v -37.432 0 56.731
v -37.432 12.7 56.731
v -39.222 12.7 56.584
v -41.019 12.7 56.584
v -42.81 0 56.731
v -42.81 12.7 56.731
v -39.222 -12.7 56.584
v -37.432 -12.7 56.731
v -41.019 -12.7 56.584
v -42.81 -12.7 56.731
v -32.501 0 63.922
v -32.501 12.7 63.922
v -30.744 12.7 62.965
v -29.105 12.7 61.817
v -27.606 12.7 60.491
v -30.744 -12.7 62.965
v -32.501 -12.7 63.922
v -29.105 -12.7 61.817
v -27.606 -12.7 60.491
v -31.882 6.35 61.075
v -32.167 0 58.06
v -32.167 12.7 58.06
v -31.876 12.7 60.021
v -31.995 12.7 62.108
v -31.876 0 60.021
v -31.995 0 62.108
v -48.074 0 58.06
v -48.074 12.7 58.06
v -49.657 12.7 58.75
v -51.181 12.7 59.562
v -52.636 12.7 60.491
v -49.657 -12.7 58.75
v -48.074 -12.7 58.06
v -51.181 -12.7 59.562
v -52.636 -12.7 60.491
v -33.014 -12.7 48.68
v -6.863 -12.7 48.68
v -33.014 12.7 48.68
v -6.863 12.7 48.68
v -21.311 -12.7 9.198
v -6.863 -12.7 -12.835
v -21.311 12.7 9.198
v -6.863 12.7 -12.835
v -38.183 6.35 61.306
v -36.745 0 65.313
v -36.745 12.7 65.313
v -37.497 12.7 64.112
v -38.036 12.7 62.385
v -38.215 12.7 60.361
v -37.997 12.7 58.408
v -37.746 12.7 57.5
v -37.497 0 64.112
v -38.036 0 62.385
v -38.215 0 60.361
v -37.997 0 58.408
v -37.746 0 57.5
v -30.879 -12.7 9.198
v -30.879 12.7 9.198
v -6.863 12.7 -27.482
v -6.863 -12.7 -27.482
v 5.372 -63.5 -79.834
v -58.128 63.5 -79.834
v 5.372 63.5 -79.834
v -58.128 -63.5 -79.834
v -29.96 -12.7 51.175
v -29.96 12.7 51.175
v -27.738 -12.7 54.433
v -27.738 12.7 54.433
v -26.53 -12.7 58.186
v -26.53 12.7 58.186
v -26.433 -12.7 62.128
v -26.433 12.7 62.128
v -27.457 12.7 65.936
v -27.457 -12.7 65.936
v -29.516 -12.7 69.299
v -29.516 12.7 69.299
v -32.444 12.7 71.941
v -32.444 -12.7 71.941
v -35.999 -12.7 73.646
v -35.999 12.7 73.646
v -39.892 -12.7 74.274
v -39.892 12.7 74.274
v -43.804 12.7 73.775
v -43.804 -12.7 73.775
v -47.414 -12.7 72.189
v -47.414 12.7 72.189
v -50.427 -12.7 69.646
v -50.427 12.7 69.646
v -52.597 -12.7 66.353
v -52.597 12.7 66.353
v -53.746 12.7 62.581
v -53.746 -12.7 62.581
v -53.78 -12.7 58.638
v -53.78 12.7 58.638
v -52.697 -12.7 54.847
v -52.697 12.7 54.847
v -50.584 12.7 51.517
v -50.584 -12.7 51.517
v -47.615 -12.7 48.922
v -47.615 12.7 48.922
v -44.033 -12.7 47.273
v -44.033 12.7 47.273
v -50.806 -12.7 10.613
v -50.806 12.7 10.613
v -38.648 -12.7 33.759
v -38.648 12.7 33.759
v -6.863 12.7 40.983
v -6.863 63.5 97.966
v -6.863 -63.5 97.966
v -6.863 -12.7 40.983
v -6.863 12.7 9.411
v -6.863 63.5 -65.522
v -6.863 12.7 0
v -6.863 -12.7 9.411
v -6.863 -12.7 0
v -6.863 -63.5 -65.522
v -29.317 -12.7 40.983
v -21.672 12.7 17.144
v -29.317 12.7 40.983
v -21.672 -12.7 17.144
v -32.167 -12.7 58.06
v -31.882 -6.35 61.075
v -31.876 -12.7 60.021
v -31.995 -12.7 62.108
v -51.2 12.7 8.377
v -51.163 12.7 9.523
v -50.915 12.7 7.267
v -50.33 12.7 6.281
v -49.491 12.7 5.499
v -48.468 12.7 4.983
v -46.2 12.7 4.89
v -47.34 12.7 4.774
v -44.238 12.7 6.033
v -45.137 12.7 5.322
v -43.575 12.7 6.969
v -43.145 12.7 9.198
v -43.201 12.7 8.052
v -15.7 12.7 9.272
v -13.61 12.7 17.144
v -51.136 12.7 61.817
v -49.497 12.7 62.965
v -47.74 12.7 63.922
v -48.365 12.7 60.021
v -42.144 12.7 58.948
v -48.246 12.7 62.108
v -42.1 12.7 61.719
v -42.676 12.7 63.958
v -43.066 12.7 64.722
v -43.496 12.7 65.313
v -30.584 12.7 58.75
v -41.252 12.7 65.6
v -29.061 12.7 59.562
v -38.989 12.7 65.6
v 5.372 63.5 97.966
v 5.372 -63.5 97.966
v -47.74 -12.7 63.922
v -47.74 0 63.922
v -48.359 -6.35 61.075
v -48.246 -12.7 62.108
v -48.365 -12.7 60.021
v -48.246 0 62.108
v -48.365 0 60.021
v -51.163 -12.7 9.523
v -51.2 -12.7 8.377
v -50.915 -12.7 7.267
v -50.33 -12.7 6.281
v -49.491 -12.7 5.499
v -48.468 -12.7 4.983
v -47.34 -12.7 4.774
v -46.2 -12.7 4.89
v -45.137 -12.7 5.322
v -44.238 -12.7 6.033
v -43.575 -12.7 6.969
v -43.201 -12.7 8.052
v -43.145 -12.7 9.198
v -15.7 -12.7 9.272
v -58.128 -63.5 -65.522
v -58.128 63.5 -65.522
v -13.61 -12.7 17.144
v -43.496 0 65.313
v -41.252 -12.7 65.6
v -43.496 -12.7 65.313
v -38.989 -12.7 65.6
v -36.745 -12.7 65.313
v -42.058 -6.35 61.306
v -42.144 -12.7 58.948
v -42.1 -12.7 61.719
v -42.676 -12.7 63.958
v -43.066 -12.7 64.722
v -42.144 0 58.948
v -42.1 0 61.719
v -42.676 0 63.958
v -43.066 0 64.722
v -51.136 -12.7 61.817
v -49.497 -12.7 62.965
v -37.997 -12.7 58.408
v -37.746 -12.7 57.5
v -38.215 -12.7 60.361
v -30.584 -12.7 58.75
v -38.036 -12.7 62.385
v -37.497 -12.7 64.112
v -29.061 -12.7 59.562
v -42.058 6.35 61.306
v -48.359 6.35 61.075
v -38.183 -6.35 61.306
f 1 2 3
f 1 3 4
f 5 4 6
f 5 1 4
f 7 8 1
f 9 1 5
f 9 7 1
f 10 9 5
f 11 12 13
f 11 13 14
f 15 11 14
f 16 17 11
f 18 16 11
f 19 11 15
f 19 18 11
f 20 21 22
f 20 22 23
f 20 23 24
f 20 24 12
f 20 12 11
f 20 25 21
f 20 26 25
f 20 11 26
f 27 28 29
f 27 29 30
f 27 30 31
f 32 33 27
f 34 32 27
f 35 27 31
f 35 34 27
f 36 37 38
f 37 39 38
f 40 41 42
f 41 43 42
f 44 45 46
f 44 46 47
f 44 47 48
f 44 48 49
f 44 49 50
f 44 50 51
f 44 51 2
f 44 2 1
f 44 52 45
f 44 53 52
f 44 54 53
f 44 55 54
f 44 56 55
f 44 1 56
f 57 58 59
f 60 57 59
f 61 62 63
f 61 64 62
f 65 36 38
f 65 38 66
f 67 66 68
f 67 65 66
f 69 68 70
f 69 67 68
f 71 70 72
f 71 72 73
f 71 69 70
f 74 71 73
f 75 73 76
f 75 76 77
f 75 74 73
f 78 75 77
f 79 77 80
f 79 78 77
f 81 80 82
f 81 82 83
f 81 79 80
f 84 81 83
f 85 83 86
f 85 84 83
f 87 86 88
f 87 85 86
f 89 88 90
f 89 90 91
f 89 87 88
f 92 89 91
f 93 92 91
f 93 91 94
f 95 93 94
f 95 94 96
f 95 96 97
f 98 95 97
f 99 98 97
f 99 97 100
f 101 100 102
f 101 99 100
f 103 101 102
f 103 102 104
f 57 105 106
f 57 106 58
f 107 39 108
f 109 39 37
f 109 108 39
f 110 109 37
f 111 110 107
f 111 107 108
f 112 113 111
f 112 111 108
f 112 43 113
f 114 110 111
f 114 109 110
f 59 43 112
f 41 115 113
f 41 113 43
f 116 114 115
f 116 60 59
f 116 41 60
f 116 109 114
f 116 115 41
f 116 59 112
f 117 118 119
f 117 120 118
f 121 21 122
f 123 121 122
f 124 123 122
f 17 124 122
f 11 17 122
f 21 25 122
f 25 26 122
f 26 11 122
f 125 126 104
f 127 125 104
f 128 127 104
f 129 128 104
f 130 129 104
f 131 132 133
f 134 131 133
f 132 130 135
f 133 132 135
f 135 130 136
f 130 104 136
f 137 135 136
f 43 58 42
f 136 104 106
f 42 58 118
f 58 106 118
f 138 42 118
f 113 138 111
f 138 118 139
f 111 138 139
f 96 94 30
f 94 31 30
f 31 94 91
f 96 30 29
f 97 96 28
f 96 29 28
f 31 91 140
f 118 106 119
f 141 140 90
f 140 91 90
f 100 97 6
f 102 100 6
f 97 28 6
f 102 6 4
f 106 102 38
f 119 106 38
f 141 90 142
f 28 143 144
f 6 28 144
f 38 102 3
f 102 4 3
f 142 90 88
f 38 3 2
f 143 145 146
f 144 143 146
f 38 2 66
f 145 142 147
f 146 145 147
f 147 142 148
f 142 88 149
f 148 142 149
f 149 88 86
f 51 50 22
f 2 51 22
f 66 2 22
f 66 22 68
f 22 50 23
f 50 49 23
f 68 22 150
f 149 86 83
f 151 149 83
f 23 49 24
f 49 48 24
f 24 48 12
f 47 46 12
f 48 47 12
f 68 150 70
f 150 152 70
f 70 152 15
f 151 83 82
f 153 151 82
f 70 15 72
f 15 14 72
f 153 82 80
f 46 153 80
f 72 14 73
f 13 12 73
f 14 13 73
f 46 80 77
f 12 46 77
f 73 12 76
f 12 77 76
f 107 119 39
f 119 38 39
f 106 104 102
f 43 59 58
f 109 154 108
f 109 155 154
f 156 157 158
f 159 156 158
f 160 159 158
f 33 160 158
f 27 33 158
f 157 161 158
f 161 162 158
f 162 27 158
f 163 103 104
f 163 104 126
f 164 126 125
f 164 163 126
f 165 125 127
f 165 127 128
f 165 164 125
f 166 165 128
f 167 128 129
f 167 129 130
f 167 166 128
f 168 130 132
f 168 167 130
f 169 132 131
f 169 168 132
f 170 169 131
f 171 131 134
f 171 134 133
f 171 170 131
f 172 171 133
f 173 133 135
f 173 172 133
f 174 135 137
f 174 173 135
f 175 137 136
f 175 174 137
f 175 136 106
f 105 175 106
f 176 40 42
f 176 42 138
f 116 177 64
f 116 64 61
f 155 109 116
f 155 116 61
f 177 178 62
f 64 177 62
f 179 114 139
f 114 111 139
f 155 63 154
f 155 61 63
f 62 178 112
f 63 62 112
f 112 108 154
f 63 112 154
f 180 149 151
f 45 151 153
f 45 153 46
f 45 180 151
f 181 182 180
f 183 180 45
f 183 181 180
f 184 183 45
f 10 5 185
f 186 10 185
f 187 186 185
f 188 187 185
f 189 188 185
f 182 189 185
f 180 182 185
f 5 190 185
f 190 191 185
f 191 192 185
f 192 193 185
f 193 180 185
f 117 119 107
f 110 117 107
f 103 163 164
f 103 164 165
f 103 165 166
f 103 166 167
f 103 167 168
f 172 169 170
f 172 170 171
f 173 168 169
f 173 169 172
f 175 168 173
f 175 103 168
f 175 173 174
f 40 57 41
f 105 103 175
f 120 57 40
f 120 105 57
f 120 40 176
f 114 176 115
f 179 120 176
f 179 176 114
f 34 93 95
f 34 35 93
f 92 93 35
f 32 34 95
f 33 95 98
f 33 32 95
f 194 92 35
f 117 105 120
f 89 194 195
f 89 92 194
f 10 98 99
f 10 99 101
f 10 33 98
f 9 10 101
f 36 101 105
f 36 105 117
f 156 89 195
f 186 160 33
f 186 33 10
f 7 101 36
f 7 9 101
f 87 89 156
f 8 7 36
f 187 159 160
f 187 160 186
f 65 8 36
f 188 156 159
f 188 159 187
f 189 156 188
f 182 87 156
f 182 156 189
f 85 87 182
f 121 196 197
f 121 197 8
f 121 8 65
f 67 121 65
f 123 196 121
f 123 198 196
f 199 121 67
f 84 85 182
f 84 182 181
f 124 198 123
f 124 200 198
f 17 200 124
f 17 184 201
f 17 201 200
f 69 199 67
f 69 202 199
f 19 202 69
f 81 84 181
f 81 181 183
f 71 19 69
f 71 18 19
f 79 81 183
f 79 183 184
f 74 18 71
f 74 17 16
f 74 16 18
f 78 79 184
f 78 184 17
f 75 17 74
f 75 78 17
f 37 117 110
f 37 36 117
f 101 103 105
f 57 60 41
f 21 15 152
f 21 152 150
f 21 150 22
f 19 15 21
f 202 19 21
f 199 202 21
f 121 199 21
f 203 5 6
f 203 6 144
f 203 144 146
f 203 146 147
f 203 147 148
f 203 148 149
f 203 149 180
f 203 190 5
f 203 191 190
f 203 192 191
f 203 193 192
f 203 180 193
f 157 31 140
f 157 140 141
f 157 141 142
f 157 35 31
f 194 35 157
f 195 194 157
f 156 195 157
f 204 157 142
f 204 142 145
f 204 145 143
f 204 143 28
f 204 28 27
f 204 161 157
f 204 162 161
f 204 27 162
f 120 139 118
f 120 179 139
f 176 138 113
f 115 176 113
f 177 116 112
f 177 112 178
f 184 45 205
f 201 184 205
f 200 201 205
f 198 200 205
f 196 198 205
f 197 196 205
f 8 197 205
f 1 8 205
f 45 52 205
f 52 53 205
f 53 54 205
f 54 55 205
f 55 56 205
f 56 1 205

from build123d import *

# Parameters (mm, degrees)
F1_DEPTH      = 63.5
F1_DEPTH_BACK = 63.5
F2_DEPTH      = 12.7
F2_DEPTH_BACK = 12.7


with BuildPart() as f1:
    # F0 (on Front) → F1 (new body, two sides)
    with BuildSketch(Plane.XZ) as f1_sk:
        Polygon((5.371508698, -65.522043058), (5.371508698, 97.9658832341), (-6.8627363071, 97.9658832341), (-6.8627363071, 48.6798776739), (-6.8627363071, 40.9828163683), (-6.8627363071, 9.4113918418), (-6.8627363071, 0), (-6.8627363071, -12.8354746848), (-6.8627363071, -27.4818117807), (-6.8627363071, -65.522043058), (-58.128491302, -65.522043058), (-58.128491302, -79.8341167659), (-6.8627363071, -79.8341167659), (5.371508698, -79.8341167659), align=None)
    extrude(amount=F1_DEPTH)
    extrude(f1_sk.sketch, amount=-F1_DEPTH_BACK)

    # F0 (on Front) → F2 (join, two sides)
    with BuildSketch(Plane.XZ) as f2_sk:
        with BuildLine():
            Line((-6.8627363071, 40.9828163683), (-6.8627363071, 48.6798776739))
            Line((-6.8627363071, 48.6798776739), (-33.0135776846, 48.6798776739))
            ThreePointArc((-33.0135776846, 48.6798776739), (-41.8657904366, 74.1654240795), (-44.0332744745, 47.2734780892))
            Line((-44.0332744745, 47.2734780892), (-50.8055312902, 10.6125895488))
            ThreePointArc((-50.8055312902, 10.6125895488), (-47.911326645, 4.8382984922), (-43.1451888861, 9.1975172982))
            Line((-43.1451888861, 9.1975172982), (-38.6480391026, 33.7588861585))
            Line((-38.6480391026, 33.7588861585), (-30.8785432337, 9.1975172982))
            Line((-30.8785432337, 9.1975172982), (-6.8627363071, -27.4818117807))
            Line((-6.8627363071, -27.4818117807), (-6.8627363071, -12.8354746848))
            Line((-6.8627363071, -12.8354746848), (-21.3106013834, 9.1975172982))
            Line((-21.3106013834, 9.1975172982), (-15.6995095313, 9.2722494155))
            Line((-15.6995095313, 9.2722494155), (-6.8627363071, 0))
            Line((-6.8627363071, 0), (-6.8627363071, 9.4113918418))
            Line((-6.8627363071, 9.4113918418), (-13.6101442425, 17.1438418329))
            Line((-13.6101442425, 17.1438418329), (-21.6717980802, 17.1438418329))
            Line((-21.6717980802, 17.1438418329), (-29.3174761241, 40.9828163683))
            Line((-29.3174761241, 40.9828163683), (-6.8627363071, 40.9828163683))
        make_face()
        with BuildLine():
            ThreePointArc((-48.0739454946, 58.0599678974), (-50.4266953443, 59.1407090556), (-52.635530327, 60.4914426804))
            ThreePointArc((-52.635530327, 60.4914426804), (-50.3327931811, 62.4139887897), (-47.7398221818, 63.9223930132))
            add(Edge.make_bspline(
                [(-47.7398221818, 63.9223930132), (-48.8867841974, 61.1721295429), (-48.0739454946, 58.0599678975)],
                knots=[4.0684612213, 4.0684612213, 4.0684612213, 5.1518534756, 5.1518534756, 5.1518534756], degree=2, weights=[1, 0.856835408, 1]))
        make_face(mode=Mode.SUBTRACT)
        with BuildLine():
            ThreePointArc((-37.4315397632, 56.7311223598), (-40.1206351817, 56.5654747777), (-42.8097306001, 56.7311223598))
            add(Edge.make_bspline(
                [(-42.8097306001, 56.7311223598), (-40.3777204819, 61.7412384639), (-43.4961171085, 65.3130386577)],
                knots=[0.8526714179, 0.8526714179, 0.8526714179, 2.5748864382, 2.5748864382, 2.5748864382], degree=2, weights=[1, 0.6515977499, 1]))
            ThreePointArc((-43.4961171085, 65.3130386577), (-40.1206351817, 65.6361303431), (-36.7451532548, 65.3130386577))
            add(Edge.make_bspline(
                [(-36.7451532548, 65.3130386577), (-39.8635498815, 61.7412384639), (-37.4315397632, 56.7311223598)],
                knots=[0.5667062154, 0.5667062154, 0.5667062154, 2.2889212357, 2.2889212357, 2.2889212357], degree=2, weights=[1, 0.6515977499, 1]))
        make_face(mode=Mode.SUBTRACT)
        with BuildLine():
            ThreePointArc((-32.5014481816, 63.9223930132), (-29.9084771822, 62.4139887897), (-27.6057400363, 60.4914426804))
            ThreePointArc((-27.6057400363, 60.4914426804), (-29.8145750191, 59.1407090556), (-32.1673248687, 58.0599678974))
            add(Edge.make_bspline(
                [(-32.1673248687, 58.0599678975), (-31.3544861659, 61.1721295429), (-32.5014481816, 63.9223930132)],
                knots=[4.2729244852, 4.2729244852, 4.2729244852, 5.3563167394, 5.3563167394, 5.3563167394], degree=2, weights=[1, 0.856835408, 1]))
        make_face(mode=Mode.SUBTRACT)
    extrude(amount=F2_DEPTH)
    extrude(f2_sk.sketch, amount=-F2_DEPTH_BACK)


solid = f1.part
